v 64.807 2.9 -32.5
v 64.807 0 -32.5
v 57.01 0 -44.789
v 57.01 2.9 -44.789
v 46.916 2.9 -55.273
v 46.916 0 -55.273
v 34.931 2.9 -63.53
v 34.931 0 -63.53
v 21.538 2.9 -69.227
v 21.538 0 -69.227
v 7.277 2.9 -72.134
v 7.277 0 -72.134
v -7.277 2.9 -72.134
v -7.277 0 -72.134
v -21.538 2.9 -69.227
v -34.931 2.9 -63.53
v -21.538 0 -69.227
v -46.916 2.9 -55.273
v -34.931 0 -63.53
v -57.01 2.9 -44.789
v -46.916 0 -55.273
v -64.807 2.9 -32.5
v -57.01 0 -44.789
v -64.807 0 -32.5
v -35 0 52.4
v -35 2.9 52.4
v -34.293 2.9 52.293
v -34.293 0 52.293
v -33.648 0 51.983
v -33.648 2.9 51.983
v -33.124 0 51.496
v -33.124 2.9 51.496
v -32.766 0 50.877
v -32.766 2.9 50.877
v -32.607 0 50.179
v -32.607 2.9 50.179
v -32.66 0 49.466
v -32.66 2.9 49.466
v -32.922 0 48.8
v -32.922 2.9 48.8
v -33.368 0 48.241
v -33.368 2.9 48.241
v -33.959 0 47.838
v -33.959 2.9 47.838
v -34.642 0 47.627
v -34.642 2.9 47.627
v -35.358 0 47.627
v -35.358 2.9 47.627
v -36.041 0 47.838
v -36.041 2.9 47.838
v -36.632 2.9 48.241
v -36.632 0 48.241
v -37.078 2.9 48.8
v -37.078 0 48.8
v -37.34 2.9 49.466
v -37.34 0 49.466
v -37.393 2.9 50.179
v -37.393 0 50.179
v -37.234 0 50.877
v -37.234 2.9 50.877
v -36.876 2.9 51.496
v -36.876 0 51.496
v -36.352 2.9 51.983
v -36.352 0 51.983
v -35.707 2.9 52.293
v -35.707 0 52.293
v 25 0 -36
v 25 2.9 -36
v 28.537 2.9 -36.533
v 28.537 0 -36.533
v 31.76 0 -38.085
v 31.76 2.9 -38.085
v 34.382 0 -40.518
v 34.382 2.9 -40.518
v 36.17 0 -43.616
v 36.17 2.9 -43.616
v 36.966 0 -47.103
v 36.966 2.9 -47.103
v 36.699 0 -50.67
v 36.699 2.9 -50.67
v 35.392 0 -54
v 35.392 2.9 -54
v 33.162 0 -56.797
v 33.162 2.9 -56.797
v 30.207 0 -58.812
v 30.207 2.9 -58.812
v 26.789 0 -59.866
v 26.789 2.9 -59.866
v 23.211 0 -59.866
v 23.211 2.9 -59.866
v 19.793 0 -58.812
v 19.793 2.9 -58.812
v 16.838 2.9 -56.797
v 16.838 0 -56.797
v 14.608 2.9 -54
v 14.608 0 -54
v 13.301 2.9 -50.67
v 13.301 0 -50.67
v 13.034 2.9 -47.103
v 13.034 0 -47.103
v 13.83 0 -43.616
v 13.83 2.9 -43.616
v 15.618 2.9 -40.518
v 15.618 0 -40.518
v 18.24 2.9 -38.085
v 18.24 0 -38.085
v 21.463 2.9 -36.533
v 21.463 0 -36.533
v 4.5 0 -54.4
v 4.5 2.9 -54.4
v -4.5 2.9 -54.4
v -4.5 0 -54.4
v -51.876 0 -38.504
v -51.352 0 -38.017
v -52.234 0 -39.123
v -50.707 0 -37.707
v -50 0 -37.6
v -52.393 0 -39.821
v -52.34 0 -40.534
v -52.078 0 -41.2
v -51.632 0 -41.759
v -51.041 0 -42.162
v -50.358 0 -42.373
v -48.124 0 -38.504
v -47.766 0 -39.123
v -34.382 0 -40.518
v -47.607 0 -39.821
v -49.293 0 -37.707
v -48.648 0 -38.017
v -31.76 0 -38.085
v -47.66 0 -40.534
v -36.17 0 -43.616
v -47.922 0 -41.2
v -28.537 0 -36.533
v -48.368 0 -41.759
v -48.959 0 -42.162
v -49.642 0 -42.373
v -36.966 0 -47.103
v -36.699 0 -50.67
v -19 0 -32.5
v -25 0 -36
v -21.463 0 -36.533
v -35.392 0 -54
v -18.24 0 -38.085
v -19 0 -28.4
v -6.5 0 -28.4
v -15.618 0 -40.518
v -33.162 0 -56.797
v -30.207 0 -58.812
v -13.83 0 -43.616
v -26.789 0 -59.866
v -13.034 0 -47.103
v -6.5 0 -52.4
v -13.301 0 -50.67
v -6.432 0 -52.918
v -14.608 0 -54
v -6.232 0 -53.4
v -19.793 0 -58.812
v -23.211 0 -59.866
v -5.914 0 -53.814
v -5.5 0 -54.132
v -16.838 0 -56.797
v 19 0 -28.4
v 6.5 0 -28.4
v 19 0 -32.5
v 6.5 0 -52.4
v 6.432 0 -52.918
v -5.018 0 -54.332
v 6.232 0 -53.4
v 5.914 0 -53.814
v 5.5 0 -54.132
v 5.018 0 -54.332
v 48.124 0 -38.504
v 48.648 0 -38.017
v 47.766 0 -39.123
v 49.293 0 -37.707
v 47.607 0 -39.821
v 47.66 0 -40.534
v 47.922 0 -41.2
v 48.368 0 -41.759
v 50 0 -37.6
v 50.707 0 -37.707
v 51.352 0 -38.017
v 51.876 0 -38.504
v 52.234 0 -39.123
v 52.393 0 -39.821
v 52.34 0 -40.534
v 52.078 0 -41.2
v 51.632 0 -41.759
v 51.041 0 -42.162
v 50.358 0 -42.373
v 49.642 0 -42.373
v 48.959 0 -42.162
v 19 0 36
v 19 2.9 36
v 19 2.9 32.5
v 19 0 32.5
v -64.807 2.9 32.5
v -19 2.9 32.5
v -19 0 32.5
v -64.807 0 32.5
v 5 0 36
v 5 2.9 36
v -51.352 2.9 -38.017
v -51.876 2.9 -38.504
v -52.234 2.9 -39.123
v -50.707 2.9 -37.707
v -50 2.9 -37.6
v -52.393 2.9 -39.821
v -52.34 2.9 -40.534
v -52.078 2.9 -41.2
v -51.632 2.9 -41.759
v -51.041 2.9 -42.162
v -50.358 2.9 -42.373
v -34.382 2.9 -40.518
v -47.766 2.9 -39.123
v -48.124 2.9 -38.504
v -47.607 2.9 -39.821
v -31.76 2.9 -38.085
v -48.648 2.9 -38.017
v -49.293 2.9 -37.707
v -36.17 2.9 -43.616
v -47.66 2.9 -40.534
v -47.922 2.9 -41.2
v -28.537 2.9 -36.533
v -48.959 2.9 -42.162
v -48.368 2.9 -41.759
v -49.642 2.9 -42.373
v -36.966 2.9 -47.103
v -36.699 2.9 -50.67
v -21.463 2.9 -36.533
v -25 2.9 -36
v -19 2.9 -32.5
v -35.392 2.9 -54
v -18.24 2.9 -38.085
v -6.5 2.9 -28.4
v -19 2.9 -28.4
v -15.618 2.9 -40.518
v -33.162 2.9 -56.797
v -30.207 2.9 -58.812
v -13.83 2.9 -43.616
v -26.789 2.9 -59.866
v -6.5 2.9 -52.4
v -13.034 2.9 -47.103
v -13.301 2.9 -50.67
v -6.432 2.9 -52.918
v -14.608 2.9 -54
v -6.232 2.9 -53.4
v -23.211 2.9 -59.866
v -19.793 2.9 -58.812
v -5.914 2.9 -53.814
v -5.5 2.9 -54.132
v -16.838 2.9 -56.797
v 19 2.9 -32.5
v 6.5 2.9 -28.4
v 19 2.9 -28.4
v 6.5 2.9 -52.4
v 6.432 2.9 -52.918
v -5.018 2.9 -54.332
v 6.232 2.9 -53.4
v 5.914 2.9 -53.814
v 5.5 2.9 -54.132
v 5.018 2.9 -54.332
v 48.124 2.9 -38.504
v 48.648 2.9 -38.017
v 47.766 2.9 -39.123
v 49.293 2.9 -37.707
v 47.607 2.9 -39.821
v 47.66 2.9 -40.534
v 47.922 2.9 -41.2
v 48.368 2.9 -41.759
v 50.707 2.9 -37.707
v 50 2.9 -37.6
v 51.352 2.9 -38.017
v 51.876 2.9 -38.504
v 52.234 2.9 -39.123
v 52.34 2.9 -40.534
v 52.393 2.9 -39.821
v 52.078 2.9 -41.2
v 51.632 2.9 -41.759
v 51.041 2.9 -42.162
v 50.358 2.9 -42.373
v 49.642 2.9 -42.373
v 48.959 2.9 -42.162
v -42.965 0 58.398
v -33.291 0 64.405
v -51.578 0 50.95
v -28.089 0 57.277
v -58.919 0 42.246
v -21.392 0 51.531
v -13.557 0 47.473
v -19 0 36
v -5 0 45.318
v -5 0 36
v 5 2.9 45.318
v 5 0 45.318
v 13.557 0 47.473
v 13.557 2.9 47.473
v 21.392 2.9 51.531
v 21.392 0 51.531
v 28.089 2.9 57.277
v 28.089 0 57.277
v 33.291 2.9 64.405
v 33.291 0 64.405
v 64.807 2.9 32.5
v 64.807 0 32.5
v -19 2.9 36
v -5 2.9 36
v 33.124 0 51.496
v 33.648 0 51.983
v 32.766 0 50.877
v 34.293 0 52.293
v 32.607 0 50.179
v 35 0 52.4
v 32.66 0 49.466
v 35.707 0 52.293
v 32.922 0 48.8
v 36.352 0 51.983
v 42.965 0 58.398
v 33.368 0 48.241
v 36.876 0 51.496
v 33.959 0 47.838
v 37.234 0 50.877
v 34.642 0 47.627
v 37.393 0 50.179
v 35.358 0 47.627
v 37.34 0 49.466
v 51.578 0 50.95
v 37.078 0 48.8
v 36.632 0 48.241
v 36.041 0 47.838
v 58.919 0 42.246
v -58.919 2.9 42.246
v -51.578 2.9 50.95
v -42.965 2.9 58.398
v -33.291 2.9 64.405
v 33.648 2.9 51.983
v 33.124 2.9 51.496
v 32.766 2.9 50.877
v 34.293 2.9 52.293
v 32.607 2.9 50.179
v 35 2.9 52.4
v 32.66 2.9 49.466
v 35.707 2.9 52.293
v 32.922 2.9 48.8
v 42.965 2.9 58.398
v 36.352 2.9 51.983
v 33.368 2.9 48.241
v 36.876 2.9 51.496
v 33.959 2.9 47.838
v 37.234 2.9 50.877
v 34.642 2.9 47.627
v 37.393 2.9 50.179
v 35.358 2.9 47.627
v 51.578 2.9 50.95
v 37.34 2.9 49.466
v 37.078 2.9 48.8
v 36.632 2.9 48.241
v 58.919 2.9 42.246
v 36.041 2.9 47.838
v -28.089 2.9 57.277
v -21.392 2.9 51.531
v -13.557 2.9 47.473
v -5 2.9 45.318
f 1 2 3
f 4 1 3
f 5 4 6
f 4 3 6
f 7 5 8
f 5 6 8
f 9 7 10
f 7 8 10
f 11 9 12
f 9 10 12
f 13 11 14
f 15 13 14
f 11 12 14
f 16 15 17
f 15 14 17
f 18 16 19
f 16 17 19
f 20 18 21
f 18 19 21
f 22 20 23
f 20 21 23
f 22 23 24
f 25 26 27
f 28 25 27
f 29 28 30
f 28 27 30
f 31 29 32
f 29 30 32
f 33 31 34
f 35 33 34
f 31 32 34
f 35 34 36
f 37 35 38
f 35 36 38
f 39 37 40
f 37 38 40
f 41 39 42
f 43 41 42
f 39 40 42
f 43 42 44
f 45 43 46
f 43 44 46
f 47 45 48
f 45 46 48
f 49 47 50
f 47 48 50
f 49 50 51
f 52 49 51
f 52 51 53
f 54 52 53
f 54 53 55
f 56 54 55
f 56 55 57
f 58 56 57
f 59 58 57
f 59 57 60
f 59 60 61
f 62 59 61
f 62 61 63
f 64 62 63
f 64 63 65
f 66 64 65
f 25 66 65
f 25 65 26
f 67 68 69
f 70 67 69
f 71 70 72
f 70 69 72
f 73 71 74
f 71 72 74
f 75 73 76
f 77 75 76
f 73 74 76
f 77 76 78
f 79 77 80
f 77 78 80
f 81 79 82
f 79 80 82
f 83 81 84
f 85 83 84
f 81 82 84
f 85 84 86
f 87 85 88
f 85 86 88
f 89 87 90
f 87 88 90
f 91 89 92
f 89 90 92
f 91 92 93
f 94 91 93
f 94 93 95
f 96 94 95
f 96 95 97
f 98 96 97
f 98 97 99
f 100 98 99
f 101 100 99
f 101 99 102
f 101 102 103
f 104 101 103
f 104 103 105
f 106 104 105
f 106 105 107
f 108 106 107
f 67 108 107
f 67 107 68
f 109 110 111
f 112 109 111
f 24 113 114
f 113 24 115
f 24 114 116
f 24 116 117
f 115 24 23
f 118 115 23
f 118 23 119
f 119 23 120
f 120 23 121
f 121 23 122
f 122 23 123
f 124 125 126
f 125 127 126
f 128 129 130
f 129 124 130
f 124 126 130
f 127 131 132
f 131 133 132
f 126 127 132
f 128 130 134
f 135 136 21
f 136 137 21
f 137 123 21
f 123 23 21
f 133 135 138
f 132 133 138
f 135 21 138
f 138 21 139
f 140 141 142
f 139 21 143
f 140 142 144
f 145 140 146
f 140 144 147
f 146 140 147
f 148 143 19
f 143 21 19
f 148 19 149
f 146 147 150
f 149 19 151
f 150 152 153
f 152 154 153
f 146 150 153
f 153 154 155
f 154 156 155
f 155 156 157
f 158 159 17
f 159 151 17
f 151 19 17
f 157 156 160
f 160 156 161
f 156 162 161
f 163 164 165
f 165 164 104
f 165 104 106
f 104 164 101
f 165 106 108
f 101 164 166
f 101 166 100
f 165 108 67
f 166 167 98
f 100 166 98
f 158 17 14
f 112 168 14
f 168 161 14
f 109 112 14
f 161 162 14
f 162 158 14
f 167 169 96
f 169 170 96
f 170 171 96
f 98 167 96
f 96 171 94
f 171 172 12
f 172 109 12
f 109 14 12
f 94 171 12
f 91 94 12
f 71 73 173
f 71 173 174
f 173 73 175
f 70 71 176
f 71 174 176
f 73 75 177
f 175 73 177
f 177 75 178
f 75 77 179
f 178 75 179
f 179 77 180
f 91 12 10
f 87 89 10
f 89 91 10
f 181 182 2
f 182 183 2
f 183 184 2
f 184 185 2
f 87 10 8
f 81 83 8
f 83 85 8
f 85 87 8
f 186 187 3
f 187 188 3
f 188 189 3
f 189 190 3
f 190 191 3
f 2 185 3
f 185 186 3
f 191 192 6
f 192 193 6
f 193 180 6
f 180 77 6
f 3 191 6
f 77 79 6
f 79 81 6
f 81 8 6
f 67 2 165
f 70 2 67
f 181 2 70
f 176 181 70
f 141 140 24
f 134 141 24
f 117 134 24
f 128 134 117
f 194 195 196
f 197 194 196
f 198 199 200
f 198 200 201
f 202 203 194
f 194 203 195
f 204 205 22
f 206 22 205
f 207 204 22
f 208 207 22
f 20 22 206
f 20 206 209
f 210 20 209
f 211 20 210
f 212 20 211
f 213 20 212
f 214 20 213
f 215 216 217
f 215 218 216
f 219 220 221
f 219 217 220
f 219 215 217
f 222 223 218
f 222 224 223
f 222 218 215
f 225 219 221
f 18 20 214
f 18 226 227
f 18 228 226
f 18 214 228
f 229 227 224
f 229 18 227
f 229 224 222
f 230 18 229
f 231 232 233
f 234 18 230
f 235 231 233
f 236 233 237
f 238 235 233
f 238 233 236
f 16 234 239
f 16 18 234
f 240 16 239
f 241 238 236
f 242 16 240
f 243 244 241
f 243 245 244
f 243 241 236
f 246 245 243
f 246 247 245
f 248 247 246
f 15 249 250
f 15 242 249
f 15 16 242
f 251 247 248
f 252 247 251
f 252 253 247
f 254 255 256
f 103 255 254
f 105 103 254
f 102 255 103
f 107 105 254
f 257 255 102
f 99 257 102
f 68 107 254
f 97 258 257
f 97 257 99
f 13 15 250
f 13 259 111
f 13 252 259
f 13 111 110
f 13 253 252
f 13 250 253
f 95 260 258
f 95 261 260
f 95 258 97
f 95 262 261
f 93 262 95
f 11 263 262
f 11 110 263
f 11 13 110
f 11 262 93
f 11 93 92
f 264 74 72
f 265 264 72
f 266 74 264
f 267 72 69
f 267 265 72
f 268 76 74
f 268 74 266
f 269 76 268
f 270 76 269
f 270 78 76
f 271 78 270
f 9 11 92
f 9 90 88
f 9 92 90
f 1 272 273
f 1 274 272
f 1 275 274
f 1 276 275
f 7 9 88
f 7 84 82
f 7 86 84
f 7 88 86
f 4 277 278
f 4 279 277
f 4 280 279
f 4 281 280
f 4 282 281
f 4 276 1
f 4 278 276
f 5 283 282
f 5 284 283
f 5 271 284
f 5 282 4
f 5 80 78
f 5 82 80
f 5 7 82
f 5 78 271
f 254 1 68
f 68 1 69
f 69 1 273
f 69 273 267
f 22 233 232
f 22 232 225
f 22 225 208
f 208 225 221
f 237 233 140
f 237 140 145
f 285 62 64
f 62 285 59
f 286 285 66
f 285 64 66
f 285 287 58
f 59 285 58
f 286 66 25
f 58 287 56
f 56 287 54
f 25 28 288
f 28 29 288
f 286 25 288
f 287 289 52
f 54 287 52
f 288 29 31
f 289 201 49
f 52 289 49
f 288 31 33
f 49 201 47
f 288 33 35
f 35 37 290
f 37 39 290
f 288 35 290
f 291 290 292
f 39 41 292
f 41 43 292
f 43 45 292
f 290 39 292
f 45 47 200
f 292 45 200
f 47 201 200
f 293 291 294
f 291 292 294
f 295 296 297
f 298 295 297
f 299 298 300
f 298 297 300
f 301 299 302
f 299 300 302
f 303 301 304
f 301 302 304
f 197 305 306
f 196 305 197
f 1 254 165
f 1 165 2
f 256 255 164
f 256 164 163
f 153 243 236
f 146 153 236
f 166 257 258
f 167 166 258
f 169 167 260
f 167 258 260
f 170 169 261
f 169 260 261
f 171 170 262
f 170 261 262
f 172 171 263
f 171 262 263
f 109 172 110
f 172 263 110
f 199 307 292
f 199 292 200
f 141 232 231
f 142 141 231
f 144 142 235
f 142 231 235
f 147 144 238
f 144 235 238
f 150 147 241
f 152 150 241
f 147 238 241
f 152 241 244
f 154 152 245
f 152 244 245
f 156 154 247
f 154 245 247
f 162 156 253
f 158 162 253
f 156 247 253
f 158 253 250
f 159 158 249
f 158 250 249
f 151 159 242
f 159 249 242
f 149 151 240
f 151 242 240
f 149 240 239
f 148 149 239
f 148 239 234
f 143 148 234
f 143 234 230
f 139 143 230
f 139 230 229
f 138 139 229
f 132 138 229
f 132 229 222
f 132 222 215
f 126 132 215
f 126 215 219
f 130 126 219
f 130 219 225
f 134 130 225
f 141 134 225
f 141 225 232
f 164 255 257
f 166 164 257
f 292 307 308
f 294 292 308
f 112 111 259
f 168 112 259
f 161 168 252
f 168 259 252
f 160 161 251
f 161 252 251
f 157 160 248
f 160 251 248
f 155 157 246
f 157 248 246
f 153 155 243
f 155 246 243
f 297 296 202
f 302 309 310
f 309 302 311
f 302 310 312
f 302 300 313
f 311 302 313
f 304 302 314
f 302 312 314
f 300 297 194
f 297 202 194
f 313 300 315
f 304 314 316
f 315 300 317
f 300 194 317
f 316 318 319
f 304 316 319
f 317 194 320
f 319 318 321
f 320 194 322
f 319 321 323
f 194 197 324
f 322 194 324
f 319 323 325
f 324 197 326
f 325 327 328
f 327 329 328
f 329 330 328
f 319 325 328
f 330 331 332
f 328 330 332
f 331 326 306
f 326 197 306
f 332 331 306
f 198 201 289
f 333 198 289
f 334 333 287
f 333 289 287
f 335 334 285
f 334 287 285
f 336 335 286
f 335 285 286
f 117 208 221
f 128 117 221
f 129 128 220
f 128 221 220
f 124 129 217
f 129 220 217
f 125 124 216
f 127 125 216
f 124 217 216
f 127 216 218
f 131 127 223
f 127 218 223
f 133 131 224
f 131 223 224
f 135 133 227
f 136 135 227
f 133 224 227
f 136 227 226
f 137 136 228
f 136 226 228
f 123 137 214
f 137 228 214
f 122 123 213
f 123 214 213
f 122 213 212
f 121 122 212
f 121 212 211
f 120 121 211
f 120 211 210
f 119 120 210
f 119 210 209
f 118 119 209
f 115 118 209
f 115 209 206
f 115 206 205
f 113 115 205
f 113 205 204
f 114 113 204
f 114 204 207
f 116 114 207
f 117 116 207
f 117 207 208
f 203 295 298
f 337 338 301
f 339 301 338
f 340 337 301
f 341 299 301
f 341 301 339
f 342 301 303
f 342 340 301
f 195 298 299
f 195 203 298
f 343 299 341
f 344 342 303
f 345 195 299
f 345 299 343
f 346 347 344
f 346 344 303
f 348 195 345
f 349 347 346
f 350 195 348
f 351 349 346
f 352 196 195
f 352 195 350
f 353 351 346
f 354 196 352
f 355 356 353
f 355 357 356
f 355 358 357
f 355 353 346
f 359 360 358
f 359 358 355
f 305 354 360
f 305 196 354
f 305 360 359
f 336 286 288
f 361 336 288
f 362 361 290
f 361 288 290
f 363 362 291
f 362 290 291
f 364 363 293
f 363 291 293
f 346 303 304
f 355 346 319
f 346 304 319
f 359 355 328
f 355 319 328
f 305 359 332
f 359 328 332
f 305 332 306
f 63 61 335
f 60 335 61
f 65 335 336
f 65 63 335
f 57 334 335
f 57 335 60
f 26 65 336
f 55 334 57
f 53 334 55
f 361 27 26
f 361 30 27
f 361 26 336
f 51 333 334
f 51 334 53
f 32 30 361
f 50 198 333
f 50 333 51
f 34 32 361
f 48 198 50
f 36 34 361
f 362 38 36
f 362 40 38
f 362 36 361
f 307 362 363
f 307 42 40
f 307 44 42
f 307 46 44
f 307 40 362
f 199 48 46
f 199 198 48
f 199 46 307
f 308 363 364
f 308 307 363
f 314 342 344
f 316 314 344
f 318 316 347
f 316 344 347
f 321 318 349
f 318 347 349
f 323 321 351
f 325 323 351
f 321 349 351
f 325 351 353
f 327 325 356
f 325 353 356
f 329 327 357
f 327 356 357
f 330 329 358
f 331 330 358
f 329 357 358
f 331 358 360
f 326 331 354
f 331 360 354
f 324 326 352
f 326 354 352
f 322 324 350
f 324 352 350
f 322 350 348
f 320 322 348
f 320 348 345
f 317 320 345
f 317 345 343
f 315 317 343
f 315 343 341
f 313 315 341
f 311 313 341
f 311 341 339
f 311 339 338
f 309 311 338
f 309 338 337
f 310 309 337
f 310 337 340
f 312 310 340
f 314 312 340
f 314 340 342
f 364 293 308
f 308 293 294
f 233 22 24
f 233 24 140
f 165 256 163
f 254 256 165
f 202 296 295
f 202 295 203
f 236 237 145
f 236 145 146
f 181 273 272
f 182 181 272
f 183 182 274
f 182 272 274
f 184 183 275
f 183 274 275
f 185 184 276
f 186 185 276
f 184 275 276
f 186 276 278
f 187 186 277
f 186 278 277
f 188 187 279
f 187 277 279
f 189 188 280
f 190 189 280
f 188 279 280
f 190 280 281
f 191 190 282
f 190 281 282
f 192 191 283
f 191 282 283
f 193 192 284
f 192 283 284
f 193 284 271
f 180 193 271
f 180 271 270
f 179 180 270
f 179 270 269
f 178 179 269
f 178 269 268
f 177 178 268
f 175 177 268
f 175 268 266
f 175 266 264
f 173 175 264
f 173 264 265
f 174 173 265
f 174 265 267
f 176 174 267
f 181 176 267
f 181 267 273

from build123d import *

# Parameters (mm, degrees)
BOSS_EXTRUDE1_DEPTH     = 2.9
SOLENOID_PLACEMENT_W    = 38
SOLENOID_PLACEMENT_H    = 64.4
CUT_EXTRUDE1_DEPTH      = 103.571487266
CUT_EXTRUDE4_DEPTH      = 103.571487266
SKETCH5_R               = 12
CUT_EXTRUDE5_DEPTH      = 103.571487266
SKETCH6_R               = 2.4
CUT_EXTRUDE6_DEPTH      = 103.571487266
CUT_EXTRUDE3_DEPTH      = 103.571487266
CUT_EXTRUDE9_DEPTH      = 98.286484159
CUT_EXTRUDE9_DEPTH_BACK = 98.286484159
SKETCH8_W               = 10
SKETCH8_H               = 62.80248699


with BuildPart() as part:
    # Sketch1 → Boss-Extrude1 (new body)
    with BuildSketch(Plane(origin=(0, 0, 0), x_dir=(1, 0, 0), z_dir=(0, 1, 0))):
        with BuildLine():
            ThreePointArc((33.29110537, -64.404598464), (0, 72.5), (-33.29110537, -64.404598464))
            ThreePointArc((-33.29110537, -64.404598464), (0, -44.989799638), (33.29110537, -64.404598464))
        make_face()
    extrude(amount=BOSS_EXTRUDE1_DEPTH)

    # solenoid placement → Cut-Extrude1 (cut, through all)
    with BuildSketch(Plane(origin=(0, 2.9, 0), x_dir=(1, 0, 0), z_dir=(0, 1, 0))):
        with Locations((0, -3.8)):
            Rectangle(SOLENOID_PLACEMENT_W, SOLENOID_PLACEMENT_H)
    extrude(amount=-CUT_EXTRUDE1_DEPTH, mode=Mode.SUBTRACT)

    # Sketch4 → Cut-Extrude4 (cut, through all)
    with BuildSketch(Plane(origin=(0, 2.9, 0), x_dir=(1, 0, 0), z_dir=(0, 1, 0))):
        with BuildLine():
            Line((-6.5, 28.1), (6.5, 28.1))
            Line((6.5, 28.1), (6.5, 52.4))
            ThreePointArc((6.5, 52.4), (5.914213562, 53.814213562), (4.5, 54.4))
            Line((4.5, 54.4), (-4.5, 54.4))
            ThreePointArc((-4.5, 54.4), (-5.914213562, 53.814213562), (-6.5, 52.4))
            Line((-6.5, 52.4), (-6.5, 28.1))
        make_face()
    extrude(amount=-CUT_EXTRUDE4_DEPTH, mode=Mode.SUBTRACT)

    # Sketch5 → Cut-Extrude5 (cut, through all)
    with BuildSketch(Plane(origin=(0, 2.9, 0), x_dir=(1, 0, 0), z_dir=(0, 1, 0))):
        with Locations(Location((-25, 48, 0), (0, 0, 270))):
            Circle(SKETCH5_R)
        with Locations(Location((25, 48, 0), (0, 0, 270))):
            Circle(SKETCH5_R)
    extrude(amount=-CUT_EXTRUDE5_DEPTH, mode=Mode.SUBTRACT)

    # Sketch6 → Cut-Extrude6 (cut, through all)
    with BuildSketch(Plane(origin=(0, 2.9, 0), x_dir=(1, 0, 0), z_dir=(0, 1, 0))):
        with Locations(Location((35, -50, 0), (0, 0, 270))):
            Circle(SKETCH6_R)
        with Locations(Location((-35, -50, 0), (0, 0, 270))):
            Circle(SKETCH6_R)
        with Locations(Location((-50, 40, 0), (0, 0, 270))):
            Circle(SKETCH6_R)
        with Locations(Location((50, 40, 0), (0, 0, 270))):
            Circle(SKETCH6_R)
    extrude(amount=-CUT_EXTRUDE6_DEPTH, mode=Mode.SUBTRACT)

    # Sketch3 → Cut-Extrude3 (cut, through all)
    with BuildSketch(Plane(origin=(0, 2.9, 0), x_dir=(1, 0, 0), z_dir=(0, 1, 0))):
        Polygon((-19, 28.4), (19, 28.4), (19, 32.5), (72.5, 32.5), (72.5, -32.5), (-72.5, -32.5), (-72.5, 32.5), (-19, 32.5), align=None)
    extrude(amount=-CUT_EXTRUDE3_DEPTH, mode=Mode.SUBTRACT)


with BuildPart() as cut_extrude3_piece_1:
    # of the separate pieces the step leaves, piece 1, a body of its own (cut_extrude3_pieces)
    add(part.part.solids().sort_by_distance((64.807406984, 0, -32.5))[0])


with BuildPart() as cut_extrude3_piece_2:
    # of the separate pieces the step leaves, piece 2, a body of its own (cut_extrude3_pieces)
    add(part.part.solids().sort_by_distance((-33.29110537, 0, 64.404598464))[0])

    # Sketch8 → Cut-Extrude9 (cut, two sides: drawn at the far end of the back side and taken through both)
    with BuildSketch(Plane(origin=(0, 2.9, 0), x_dir=(1, 0, 0), z_dir=(0, 1, 0)).offset(-CUT_EXTRUDE9_DEPTH_BACK)):
        with Locations((0, -31.401243495)):
            Rectangle(SKETCH8_W, SKETCH8_H)
    extrude(amount=CUT_EXTRUDE9_DEPTH + CUT_EXTRUDE9_DEPTH_BACK, mode=Mode.SUBTRACT)


with BuildPart() as cut_extrude9_piece_1:
    # of the separate pieces the step leaves, piece 1, a body of its own (cut_extrude9_pieces)
    add(cut_extrude3_piece_2.part.solids().sort_by_distance((-33.29110537, 0, 64.404598464))[0])


with BuildPart() as cut_extrude9_piece_2:
    # of the separate pieces the step leaves, piece 2, a body of its own (cut_extrude9_pieces)
    add(cut_extrude3_piece_2.part.solids().sort_by_distance((5, 0, 45.318005113))[0])


solid = Compound([cut_extrude3_piece_1.part, cut_extrude9_piece_1.part, cut_extrude9_piece_2.part])
